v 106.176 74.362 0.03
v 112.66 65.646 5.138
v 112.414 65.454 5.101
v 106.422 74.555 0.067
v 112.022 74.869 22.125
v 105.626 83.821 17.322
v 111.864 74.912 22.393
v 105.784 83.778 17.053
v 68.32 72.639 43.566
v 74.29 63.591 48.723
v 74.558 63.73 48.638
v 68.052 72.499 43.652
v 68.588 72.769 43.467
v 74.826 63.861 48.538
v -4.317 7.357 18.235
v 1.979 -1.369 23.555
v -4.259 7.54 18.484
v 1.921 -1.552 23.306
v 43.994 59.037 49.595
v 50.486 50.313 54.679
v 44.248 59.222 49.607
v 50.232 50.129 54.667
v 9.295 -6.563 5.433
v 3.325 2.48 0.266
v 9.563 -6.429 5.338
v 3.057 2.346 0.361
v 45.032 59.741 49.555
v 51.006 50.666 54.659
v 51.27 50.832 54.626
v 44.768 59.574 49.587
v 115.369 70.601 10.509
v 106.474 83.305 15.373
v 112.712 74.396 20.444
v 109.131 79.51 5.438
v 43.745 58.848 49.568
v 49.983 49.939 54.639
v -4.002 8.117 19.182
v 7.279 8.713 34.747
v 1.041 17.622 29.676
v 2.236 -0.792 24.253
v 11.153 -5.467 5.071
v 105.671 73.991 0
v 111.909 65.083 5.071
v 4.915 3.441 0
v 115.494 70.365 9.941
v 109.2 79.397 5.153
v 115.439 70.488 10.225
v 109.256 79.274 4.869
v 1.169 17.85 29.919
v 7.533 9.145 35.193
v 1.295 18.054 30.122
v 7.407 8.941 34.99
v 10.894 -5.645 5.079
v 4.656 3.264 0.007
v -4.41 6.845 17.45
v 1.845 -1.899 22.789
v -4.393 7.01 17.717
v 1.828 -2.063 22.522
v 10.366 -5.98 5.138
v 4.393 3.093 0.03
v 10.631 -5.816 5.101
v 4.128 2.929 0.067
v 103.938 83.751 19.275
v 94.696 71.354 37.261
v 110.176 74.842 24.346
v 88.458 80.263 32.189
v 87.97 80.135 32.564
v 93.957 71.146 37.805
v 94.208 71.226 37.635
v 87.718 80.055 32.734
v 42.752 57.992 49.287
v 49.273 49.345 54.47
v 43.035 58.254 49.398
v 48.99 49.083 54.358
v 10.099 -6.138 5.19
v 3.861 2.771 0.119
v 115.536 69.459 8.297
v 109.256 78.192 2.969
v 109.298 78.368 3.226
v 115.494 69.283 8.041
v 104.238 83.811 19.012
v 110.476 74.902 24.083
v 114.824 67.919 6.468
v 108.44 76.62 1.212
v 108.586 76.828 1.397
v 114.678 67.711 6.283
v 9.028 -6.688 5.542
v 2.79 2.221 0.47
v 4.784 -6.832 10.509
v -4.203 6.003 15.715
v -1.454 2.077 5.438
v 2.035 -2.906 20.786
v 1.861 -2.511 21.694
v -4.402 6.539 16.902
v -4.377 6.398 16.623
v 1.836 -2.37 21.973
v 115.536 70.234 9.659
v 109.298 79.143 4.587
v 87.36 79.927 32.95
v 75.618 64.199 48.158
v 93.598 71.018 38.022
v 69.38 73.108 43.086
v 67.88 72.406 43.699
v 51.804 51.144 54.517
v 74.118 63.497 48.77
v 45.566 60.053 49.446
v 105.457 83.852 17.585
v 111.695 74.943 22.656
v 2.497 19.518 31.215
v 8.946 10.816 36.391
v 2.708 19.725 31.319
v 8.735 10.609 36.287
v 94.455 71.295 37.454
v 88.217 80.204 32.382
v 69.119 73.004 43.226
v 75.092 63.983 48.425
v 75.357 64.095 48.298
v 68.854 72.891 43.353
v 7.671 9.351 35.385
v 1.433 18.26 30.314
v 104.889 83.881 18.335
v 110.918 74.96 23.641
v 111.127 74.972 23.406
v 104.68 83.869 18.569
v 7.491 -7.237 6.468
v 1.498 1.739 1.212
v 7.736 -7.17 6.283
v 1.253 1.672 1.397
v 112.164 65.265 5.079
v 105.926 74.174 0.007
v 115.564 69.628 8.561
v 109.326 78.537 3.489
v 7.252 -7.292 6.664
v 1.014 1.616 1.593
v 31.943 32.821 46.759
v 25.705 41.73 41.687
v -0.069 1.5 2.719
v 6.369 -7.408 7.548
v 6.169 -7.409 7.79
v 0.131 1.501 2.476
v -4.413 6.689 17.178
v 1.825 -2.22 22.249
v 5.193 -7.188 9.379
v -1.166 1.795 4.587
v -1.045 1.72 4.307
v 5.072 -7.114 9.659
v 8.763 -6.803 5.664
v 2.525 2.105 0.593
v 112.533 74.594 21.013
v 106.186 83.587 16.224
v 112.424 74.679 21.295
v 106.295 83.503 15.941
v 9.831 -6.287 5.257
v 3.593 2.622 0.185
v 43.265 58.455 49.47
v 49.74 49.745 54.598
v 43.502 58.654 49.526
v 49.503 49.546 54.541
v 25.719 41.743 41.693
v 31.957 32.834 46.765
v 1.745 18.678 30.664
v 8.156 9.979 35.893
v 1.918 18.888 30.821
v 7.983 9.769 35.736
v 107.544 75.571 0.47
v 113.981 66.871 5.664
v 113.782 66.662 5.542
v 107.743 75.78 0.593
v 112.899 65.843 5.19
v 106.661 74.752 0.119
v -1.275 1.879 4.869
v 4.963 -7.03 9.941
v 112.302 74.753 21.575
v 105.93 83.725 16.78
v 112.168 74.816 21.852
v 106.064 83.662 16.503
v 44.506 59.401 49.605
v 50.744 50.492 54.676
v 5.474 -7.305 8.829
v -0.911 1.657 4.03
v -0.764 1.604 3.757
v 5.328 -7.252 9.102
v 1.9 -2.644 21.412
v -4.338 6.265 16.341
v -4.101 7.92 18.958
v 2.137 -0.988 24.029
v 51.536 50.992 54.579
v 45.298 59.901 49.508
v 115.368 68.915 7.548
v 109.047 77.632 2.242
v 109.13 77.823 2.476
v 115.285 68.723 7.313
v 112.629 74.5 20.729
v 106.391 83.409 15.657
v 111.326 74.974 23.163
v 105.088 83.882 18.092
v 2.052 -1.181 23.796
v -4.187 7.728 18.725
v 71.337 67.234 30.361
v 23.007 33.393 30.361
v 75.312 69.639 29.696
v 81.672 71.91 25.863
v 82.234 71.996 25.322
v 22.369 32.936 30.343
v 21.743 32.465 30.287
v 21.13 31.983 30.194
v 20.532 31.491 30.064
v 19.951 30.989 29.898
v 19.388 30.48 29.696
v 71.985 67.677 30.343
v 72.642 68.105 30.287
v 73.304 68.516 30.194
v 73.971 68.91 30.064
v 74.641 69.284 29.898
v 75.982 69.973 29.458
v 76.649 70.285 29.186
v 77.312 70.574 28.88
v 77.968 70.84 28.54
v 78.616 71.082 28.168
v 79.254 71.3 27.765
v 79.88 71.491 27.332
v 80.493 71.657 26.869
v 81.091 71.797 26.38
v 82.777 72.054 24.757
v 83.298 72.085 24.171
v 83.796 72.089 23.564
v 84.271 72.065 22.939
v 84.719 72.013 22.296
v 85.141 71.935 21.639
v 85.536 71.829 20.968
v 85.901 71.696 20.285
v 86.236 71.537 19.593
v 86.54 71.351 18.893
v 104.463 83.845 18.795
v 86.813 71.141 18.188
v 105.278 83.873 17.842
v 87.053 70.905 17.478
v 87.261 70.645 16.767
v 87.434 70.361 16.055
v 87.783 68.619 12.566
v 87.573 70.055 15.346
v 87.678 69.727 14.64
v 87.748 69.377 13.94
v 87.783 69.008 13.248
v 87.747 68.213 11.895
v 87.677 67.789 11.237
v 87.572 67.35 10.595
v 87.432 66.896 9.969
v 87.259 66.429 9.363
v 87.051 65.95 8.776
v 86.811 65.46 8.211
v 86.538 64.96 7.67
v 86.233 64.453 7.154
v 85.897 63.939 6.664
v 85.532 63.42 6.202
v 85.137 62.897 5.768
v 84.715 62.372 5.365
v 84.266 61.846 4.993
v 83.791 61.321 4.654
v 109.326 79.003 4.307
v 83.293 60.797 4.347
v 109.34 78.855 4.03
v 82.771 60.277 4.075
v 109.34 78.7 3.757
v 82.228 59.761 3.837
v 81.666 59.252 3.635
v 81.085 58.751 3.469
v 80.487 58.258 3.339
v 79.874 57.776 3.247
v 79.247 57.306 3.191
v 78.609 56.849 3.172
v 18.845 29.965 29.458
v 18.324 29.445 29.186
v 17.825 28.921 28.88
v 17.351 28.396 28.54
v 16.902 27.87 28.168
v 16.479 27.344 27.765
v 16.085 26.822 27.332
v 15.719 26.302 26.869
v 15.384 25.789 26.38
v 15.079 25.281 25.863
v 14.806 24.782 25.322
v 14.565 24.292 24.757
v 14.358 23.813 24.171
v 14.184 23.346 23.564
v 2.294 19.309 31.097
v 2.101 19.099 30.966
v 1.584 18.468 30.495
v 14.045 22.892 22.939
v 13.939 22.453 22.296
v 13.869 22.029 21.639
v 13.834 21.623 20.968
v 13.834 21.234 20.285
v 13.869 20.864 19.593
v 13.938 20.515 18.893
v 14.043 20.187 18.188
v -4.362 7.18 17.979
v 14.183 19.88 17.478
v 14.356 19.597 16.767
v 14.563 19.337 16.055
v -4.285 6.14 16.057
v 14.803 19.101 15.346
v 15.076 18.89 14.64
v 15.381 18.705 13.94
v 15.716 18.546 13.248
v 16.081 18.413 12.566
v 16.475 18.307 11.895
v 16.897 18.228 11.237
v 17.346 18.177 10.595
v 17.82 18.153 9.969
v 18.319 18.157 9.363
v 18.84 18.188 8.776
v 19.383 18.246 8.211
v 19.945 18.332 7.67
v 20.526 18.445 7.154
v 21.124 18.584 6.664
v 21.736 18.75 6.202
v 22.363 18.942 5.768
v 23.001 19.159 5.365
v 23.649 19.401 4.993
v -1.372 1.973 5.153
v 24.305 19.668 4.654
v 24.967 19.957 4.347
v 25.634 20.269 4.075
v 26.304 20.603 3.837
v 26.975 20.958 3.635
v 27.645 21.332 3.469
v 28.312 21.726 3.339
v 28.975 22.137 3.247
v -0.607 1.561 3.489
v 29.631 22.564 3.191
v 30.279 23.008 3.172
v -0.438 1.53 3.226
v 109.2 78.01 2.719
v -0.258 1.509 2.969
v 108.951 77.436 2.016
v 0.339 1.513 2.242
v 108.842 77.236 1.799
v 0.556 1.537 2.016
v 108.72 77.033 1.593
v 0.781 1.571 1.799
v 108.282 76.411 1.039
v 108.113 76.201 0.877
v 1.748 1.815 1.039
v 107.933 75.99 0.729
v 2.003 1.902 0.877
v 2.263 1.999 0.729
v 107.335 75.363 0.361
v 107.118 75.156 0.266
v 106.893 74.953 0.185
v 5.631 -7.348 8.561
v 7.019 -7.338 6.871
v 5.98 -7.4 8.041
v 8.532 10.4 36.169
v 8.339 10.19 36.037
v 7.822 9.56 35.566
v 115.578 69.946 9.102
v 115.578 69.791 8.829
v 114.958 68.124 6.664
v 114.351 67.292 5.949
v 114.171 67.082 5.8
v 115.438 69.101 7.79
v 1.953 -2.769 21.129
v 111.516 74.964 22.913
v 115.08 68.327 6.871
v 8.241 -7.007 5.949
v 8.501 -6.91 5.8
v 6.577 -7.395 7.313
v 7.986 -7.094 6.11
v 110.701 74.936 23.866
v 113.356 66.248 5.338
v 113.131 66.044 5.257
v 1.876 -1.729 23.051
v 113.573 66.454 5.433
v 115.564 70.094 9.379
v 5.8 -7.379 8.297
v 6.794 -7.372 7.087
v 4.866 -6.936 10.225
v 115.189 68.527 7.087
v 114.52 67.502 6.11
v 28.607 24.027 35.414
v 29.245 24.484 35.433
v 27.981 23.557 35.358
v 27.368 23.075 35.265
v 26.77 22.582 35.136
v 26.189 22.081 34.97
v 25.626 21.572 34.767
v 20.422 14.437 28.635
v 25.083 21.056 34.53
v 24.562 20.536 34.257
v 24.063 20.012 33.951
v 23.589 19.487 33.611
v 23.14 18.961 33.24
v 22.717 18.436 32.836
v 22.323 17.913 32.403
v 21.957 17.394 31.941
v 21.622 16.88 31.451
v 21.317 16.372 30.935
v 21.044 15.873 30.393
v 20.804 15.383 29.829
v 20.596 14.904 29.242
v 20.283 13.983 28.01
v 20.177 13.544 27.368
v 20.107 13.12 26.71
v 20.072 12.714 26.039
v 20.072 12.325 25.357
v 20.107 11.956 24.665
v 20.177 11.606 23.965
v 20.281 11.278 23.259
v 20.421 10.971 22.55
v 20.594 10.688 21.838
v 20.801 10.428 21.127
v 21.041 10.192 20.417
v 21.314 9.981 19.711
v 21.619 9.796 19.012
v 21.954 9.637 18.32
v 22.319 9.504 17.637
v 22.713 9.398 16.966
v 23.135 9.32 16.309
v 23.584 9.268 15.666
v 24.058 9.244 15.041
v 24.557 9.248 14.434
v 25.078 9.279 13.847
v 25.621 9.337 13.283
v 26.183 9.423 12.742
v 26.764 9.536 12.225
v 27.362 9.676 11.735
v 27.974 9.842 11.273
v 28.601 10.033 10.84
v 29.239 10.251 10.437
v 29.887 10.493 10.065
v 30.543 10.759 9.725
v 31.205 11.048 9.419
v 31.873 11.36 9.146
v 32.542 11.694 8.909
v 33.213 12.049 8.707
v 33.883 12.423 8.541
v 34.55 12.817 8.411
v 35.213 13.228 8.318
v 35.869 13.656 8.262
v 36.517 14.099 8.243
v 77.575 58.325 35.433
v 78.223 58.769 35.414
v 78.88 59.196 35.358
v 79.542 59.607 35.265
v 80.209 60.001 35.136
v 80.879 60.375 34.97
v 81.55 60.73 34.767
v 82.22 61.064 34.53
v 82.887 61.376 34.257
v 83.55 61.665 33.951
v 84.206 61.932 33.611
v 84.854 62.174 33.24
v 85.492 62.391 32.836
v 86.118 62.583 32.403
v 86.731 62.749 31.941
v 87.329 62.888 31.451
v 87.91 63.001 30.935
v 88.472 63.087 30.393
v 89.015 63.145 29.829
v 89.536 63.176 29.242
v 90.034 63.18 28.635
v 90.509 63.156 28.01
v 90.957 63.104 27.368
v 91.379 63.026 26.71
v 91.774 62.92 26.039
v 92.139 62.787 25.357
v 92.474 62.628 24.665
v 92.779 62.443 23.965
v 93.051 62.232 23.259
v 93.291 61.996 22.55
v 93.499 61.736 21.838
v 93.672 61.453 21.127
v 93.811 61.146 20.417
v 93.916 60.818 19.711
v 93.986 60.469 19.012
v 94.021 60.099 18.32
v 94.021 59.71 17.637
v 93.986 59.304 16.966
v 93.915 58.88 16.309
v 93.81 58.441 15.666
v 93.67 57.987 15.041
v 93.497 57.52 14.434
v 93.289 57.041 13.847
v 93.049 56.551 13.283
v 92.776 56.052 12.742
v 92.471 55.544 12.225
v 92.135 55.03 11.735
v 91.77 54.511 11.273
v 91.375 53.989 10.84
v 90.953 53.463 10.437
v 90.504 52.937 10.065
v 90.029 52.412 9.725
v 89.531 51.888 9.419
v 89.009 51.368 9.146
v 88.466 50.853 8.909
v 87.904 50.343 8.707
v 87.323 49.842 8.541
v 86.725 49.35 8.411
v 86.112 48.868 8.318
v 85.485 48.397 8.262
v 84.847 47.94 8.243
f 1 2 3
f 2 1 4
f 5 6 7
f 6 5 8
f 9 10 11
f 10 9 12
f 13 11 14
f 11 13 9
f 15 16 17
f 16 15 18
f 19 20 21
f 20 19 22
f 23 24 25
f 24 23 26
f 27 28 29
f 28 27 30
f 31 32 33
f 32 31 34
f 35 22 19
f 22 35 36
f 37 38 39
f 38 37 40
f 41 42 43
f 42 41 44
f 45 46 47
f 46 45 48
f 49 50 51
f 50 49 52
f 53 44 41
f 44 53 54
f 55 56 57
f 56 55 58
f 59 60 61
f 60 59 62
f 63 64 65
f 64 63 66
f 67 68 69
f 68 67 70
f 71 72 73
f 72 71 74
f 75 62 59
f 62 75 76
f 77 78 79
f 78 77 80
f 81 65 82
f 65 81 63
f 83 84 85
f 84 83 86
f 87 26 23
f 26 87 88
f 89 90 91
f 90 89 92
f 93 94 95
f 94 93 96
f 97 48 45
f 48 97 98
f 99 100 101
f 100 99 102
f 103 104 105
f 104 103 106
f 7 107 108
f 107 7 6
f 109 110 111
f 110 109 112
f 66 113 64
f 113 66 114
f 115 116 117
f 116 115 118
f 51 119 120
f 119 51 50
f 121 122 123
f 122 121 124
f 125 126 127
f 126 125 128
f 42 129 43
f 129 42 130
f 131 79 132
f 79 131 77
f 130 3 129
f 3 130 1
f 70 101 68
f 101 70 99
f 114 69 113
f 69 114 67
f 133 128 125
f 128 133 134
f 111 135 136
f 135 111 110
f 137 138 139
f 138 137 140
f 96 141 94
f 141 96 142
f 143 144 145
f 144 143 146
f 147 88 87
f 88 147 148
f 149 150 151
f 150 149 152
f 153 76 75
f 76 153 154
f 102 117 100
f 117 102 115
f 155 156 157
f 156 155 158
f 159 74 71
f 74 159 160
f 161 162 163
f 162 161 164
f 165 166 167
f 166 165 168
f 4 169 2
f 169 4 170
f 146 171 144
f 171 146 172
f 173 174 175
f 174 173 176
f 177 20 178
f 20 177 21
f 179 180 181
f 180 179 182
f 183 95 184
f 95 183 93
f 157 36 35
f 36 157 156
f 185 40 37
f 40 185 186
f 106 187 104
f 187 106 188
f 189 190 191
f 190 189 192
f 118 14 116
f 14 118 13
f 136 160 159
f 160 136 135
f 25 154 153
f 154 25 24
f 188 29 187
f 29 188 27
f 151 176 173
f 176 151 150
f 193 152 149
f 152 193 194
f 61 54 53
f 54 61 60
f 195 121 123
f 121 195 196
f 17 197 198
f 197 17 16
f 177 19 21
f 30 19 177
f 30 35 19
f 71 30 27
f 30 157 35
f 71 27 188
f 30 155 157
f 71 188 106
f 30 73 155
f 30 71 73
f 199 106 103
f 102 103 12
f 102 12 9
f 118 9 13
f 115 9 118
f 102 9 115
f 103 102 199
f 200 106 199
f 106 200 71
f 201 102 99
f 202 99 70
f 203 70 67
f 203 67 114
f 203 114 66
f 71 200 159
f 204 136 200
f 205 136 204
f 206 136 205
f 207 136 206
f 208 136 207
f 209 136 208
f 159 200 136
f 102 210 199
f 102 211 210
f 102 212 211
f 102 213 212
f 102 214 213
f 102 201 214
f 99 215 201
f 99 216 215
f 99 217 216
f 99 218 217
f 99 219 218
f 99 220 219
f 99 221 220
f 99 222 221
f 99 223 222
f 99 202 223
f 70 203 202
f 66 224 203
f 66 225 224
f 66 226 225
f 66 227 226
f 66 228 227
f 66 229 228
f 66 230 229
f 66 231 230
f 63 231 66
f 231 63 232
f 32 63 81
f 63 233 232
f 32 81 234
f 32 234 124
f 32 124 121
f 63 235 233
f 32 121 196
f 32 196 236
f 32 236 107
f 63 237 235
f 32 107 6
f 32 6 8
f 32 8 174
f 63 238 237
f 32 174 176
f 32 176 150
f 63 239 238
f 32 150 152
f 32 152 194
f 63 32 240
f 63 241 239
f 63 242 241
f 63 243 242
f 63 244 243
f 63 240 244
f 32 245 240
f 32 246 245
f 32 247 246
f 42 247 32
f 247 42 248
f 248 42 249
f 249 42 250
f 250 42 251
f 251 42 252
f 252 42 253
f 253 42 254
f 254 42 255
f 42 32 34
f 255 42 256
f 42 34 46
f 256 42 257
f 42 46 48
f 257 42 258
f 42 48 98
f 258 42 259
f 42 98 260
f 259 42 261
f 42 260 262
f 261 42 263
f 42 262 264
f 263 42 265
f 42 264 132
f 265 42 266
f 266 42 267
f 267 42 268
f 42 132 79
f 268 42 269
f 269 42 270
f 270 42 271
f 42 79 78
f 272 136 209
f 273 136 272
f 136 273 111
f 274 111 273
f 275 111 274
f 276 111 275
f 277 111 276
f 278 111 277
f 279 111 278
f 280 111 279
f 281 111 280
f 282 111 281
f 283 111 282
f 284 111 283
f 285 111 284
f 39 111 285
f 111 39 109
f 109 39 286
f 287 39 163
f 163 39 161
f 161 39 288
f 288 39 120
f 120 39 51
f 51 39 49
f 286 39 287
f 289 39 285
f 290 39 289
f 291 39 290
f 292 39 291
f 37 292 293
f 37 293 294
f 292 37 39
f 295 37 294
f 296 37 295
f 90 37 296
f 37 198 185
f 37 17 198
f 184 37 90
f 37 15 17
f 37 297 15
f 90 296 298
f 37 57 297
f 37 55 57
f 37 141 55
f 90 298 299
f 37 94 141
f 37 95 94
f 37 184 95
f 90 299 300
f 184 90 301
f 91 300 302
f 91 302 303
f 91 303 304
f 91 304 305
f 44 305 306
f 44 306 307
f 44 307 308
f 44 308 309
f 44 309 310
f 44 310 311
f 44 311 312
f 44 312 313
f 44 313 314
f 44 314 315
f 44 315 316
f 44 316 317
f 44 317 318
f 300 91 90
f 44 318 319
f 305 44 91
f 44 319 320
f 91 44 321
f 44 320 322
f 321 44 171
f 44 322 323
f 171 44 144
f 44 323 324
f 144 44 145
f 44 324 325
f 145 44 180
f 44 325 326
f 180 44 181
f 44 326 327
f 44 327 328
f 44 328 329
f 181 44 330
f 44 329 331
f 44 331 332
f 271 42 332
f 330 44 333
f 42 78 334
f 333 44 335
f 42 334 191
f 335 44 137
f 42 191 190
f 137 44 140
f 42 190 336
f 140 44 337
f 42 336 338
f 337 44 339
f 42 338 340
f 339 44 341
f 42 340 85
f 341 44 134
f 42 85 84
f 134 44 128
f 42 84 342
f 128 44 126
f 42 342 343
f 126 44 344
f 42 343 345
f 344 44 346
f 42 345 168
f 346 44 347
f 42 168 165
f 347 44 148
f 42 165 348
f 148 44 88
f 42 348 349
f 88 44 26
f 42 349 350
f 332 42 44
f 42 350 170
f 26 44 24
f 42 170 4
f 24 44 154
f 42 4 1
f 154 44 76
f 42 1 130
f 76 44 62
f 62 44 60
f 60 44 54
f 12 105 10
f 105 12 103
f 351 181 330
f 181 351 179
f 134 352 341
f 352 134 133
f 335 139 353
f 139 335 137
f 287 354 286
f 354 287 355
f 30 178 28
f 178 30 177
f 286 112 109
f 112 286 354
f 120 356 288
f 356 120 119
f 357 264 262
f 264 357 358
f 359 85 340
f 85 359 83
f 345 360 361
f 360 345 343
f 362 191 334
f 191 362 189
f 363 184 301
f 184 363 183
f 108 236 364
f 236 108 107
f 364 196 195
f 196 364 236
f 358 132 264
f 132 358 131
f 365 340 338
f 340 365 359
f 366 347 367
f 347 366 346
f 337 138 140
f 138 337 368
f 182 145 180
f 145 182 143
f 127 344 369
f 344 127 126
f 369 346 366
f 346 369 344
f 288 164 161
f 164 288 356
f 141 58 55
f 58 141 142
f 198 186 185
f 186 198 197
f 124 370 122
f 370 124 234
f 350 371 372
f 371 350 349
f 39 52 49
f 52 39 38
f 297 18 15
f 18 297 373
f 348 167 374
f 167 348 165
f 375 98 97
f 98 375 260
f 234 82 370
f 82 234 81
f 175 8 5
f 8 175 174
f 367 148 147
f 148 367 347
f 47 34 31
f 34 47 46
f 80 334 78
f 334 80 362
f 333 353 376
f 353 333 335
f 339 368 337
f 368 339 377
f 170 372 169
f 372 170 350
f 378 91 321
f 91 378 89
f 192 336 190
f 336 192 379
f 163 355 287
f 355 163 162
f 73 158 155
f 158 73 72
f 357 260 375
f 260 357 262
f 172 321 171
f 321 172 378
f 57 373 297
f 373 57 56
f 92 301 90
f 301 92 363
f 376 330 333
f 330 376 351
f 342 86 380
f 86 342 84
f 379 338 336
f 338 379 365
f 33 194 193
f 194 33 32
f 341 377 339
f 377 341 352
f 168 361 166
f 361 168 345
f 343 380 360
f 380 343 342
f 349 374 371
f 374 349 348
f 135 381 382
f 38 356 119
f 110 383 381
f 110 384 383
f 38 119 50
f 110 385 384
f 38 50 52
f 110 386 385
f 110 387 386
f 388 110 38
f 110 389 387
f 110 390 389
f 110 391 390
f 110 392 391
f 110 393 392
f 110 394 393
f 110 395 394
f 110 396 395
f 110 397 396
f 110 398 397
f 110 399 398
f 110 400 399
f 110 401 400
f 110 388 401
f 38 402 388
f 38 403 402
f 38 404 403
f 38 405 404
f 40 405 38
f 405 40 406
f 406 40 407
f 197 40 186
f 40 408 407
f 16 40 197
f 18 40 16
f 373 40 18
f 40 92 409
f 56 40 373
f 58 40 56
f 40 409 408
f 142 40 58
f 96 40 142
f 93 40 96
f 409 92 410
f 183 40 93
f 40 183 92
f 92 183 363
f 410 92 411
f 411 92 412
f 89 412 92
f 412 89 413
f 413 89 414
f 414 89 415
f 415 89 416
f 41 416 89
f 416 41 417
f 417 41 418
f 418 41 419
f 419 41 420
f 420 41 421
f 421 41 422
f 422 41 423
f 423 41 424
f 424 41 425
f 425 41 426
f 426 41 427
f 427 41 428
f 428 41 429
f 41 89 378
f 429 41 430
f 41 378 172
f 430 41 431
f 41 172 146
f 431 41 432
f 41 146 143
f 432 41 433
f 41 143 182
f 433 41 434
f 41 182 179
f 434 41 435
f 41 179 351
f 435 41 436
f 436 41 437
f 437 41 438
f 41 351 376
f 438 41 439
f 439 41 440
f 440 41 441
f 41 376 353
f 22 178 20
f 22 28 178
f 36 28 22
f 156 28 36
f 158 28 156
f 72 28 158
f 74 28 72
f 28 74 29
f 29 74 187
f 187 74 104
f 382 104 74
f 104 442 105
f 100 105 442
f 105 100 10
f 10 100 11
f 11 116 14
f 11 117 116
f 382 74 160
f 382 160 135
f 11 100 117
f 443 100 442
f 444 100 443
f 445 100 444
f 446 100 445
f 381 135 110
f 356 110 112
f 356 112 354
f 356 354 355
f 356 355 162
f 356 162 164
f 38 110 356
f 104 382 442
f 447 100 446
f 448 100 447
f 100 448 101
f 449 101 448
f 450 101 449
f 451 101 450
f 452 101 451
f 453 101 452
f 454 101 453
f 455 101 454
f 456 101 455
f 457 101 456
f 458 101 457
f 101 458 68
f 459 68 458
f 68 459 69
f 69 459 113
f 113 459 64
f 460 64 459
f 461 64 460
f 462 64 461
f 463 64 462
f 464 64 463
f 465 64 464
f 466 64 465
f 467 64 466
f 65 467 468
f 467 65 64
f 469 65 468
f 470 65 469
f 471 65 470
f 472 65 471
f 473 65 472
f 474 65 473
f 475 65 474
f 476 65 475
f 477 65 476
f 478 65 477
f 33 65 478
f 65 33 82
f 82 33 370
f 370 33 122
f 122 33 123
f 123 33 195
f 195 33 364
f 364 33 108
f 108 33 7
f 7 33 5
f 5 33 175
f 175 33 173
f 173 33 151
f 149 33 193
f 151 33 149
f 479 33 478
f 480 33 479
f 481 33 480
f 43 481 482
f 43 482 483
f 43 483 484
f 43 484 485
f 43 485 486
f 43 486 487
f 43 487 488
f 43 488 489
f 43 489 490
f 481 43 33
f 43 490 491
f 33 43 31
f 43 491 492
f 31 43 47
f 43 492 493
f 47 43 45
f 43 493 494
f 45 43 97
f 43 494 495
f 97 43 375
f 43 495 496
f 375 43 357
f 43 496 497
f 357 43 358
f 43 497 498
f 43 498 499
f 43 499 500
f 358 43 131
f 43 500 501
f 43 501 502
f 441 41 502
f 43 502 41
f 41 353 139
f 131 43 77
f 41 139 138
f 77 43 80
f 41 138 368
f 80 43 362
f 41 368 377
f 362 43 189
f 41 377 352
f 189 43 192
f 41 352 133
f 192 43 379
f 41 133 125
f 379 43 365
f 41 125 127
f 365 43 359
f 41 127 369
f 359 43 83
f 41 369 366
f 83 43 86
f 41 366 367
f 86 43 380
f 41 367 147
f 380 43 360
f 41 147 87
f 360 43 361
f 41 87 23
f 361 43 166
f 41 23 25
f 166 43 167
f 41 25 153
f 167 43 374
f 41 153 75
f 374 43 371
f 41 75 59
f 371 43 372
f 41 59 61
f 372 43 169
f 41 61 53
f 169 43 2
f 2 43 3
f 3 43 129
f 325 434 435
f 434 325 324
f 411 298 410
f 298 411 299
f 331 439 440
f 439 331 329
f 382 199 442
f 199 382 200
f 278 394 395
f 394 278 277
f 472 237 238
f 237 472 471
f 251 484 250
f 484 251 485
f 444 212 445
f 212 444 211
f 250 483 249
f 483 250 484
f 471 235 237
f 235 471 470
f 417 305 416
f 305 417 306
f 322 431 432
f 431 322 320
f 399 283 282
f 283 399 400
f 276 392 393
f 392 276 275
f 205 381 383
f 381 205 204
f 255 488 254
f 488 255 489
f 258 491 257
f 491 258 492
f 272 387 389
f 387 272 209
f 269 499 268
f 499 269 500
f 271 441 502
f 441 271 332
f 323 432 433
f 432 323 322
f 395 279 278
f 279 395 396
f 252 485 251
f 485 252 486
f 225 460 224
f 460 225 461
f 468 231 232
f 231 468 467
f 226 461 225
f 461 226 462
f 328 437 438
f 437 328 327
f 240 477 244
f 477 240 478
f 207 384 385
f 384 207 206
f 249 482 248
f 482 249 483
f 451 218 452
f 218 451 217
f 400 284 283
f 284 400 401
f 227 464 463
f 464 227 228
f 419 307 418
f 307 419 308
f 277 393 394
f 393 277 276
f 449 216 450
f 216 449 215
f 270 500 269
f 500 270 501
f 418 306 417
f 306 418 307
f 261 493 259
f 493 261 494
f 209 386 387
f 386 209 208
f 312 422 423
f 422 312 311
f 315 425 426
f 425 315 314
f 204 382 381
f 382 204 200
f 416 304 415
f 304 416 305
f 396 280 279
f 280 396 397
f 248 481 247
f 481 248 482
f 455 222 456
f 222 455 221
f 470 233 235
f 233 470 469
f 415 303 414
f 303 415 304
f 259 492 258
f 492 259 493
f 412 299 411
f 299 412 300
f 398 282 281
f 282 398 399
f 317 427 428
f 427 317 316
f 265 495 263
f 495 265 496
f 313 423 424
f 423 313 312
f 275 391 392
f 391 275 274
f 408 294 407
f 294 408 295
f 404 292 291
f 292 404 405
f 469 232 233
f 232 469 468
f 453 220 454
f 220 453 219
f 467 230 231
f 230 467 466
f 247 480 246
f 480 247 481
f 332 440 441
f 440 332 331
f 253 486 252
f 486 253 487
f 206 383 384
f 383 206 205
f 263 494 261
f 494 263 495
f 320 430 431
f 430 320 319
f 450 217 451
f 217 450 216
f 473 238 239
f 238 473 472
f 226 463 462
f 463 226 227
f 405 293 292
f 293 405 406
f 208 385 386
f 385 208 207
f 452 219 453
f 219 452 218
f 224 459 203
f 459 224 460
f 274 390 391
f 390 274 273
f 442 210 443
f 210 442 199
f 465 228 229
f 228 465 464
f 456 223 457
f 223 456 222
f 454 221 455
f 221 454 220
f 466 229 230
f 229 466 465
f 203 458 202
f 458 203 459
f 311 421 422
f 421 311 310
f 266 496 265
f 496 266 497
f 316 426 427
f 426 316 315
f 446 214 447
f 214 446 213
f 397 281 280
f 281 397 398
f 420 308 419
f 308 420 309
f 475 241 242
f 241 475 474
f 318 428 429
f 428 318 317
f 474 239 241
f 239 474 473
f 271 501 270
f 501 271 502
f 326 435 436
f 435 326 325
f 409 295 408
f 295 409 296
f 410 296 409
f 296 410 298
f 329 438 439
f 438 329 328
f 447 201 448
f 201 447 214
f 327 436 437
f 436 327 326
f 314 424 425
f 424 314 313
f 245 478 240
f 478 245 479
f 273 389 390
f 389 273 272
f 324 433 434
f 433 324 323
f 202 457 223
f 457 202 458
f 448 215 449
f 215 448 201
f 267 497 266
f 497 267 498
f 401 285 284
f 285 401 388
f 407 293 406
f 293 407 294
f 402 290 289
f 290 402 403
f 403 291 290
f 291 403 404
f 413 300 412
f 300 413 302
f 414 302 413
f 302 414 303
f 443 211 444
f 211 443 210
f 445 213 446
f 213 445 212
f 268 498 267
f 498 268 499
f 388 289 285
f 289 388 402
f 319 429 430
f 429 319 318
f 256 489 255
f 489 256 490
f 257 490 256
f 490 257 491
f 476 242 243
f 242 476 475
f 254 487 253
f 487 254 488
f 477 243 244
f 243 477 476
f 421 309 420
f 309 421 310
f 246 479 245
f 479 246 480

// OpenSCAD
// Вариант 3. Параметрическая модель для получения скриншотов в OpenSCAD.
// Используй переменную scene_mode:
// 0 - деталь
// 1 - заготовка
// 2 - деталь и заготовка рядом

scene_mode = 0;

$fn = 120;

L1 = 135;
L2 = 25;
L3 = 26;
L4 = 33;
R1 = 17;
R2 = 25;
R3 = 30;
R4 = 20;
R5 = 16;
B1 = 16;
B2 = 19.5;
H  = 12;

stock_x = 145;
stock_y = 60;
stock_z = H;

module rounded_slot(len, height, rad) {
    hull() {
        translate([rad, rad]) circle(r = rad);
        translate([len - rad, rad]) circle(r = rad);
        translate([rad, height - rad]) circle(r = rad);
        translate([len - rad, height - rad]) circle(r = rad);
    }
}

module outer_profile() {
    // Упрощенный контур по эскизу варианта 3:
    // низ прямой, слева скругление и сверху плавный подъем с правым радиусным окончанием.
    linear_extrude(height = H)
    polygon(points = [
        [0, 0],
        [0, B2],
        [12, 34],
        [45, 46],
        [70, 55],
        [98, 48],
        [118, 36],
        [L1, B2],
        [L1, 0]
    ]);
}

module outer_profile_smooth() {
    linear_extrude(height = H)
    offset(r = 6)
    offset(delta = -6)
    polygon(points = [
        [0, 0],
        [0, B2],
        [12, 34],
        [45, 46],
        [70, 55],
        [98, 48],
        [118, 36],
        [L1, B2],
        [L1, 0]
    ]);
}

module inner_cut() {
    translate([L2 - 2, 3.5, -0.1])
    linear_extrude(height = H + 0.2)
    rounded_slot(89, 30, 15);
}

module detail_part() {
    difference() {
        color([0.82, 0.86, 0.93]) outer_profile_smooth();
        inner_cut();
    }
}

module stock_part() {
    color([0.88, 0.88, 0.88])
    cube([stock_x, stock_y, stock_z]);
}

module scene_detail() {
    rotate([65, 0, 35]) detail_part();
}

module scene_stock() {
    rotate([65, 0, 35]) stock_part();
}

module scene_both() {
    translate([-90, 0, 0]) rotate([65, 0, 35]) stock_part();
    translate([80, 0, 0]) rotate([65, 0, 35]) detail_part();
}

if (scene_mode == 0) {
    scene_detail();
} else if (scene_mode == 1) {
    scene_stock();
} else {
    scene_both();
}
